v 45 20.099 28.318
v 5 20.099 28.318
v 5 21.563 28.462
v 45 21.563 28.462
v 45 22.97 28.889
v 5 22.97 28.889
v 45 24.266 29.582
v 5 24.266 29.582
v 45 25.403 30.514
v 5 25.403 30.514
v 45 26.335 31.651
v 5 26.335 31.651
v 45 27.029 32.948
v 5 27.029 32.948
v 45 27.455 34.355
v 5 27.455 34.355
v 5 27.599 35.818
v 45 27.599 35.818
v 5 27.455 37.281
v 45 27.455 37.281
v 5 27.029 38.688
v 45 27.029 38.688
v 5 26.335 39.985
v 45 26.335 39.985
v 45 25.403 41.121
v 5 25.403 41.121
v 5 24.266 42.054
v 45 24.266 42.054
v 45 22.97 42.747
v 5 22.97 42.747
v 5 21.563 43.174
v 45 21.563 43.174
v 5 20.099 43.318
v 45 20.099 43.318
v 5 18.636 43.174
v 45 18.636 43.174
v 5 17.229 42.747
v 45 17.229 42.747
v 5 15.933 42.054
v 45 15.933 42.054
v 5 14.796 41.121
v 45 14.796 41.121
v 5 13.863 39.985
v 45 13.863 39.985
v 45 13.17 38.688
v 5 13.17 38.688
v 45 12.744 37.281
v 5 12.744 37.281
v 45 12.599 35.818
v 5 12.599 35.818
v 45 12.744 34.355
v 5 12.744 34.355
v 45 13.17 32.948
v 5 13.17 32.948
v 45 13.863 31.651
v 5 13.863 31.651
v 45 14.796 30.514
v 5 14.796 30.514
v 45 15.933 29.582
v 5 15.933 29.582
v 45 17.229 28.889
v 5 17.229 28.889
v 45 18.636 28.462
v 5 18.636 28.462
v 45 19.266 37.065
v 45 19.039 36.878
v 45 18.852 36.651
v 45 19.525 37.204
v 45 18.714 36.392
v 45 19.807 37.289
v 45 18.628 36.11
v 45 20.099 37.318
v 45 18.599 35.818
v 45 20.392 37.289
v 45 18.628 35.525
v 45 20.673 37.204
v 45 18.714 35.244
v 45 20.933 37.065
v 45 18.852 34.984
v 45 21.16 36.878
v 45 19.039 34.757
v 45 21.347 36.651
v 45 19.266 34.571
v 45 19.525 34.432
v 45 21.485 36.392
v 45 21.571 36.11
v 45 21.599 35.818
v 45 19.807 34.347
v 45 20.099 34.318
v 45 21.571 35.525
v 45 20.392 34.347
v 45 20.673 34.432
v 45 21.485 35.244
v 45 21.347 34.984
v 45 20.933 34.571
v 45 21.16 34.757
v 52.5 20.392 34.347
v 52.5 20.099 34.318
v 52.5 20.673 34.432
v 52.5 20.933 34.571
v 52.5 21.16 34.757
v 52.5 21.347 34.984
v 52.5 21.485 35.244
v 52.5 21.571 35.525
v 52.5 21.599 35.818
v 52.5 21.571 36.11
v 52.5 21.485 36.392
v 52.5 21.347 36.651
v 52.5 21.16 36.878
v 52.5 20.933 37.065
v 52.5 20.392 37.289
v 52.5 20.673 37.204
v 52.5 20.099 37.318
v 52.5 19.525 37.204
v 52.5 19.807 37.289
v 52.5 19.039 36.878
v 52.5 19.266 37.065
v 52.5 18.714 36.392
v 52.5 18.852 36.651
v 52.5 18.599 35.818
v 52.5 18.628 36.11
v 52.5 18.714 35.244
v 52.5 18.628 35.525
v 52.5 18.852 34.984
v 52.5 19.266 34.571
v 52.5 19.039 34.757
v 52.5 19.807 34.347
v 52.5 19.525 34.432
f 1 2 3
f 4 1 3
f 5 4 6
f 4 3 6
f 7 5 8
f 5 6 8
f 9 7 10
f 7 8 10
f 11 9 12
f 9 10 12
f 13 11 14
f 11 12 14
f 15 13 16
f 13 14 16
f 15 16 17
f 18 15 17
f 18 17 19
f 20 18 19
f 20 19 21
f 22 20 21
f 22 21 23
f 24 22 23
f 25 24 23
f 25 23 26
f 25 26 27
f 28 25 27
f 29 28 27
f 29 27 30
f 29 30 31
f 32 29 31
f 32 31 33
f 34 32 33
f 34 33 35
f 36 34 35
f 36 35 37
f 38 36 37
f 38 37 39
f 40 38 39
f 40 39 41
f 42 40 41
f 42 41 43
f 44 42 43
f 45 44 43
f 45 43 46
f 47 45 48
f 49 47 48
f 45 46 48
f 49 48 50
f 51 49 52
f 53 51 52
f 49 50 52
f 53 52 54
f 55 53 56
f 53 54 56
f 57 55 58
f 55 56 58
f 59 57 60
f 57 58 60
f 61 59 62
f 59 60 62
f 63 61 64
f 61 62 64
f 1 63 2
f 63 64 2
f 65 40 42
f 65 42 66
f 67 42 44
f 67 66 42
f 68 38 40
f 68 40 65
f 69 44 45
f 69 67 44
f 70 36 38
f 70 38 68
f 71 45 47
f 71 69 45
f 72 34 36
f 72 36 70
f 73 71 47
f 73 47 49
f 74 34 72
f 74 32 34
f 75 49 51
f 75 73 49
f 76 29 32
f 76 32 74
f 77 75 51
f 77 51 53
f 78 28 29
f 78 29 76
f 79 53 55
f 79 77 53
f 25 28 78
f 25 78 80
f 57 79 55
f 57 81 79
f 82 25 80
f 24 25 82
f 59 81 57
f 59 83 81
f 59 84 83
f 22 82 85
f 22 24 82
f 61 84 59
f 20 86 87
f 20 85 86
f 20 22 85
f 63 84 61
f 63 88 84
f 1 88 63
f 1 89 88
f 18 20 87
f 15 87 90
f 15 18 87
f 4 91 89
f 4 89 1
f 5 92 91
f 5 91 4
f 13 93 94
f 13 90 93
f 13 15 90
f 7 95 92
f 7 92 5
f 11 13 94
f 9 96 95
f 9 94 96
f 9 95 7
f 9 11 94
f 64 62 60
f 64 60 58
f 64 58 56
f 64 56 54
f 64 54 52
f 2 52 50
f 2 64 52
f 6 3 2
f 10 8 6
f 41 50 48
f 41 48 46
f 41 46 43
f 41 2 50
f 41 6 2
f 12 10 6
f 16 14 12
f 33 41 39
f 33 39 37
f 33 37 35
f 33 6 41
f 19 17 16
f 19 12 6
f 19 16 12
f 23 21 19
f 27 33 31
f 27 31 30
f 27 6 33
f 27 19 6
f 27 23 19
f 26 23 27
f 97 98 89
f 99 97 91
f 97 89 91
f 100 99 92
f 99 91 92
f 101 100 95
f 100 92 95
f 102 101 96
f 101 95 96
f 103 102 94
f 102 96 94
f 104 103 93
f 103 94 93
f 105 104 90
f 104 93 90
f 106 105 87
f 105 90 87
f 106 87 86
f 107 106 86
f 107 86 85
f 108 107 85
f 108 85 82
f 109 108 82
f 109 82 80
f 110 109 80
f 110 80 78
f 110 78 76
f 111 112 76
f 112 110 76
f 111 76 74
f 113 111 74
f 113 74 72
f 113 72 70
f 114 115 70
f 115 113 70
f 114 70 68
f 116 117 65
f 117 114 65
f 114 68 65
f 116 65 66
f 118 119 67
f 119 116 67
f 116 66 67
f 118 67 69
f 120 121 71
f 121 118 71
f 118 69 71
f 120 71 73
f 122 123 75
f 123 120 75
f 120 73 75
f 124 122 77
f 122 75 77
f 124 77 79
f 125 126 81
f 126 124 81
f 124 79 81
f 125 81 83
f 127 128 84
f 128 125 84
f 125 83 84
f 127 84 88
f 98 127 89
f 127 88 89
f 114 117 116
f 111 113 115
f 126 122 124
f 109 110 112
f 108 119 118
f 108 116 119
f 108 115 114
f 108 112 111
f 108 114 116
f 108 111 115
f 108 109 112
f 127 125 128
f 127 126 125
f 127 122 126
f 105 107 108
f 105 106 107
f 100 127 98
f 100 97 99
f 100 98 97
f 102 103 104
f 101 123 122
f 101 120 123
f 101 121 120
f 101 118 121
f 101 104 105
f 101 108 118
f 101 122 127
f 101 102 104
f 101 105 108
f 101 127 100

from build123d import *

# Parameters (mm, degrees)
SKETCH1_R           = 7.5
BOSS_EXTRUDE1_DEPTH = 45
SKETCH2_R           = 1.5
BOSS_EXTRUDE2_DEPTH = 15
SKETCH3_R           = 3.389534101
CUT_EXTRUDE1_DEPTH  = 7.5
SKETCH4_R           = 13.089152616
CUT_EXTRUDE2_DEPTH  = 5


with BuildPart() as part:
    # Sketch1 → Boss-Extrude1 (new body)
    with BuildSketch(Plane(origin=(0, 0, 0), x_dir=(0, 0, -1), z_dir=(1, 0, 0))):
        with Locations((-35.817726835, 20.099436521)):
            Circle(SKETCH1_R)
    extrude(amount=BOSS_EXTRUDE1_DEPTH)

    # Sketch2 → Boss-Extrude2 (add)
    with BuildSketch(Plane(origin=(45, 0, 0), x_dir=(0, 0, -1), z_dir=(1, 0, 0))):
        with Locations((-35.817726835, 20.099436521)):
            Circle(SKETCH2_R)
    extrude(amount=BOSS_EXTRUDE2_DEPTH)

    # Sketch3 → Cut-Extrude1 (cut)
    with BuildSketch(Plane(origin=(60, 0, 0), x_dir=(0, 0, -1), z_dir=(1, 0, 0))):
        with Locations((-35.761209842, 20.149750274)):
            Circle(SKETCH3_R)
    extrude(amount=-CUT_EXTRUDE1_DEPTH, mode=Mode.SUBTRACT)

    # Sketch4 → Cut-Extrude2 (cut)
    with BuildSketch(Plane.ZY):
        with Locations((34.849696462, 19.463840008)):
            Circle(SKETCH4_R)
    extrude(amount=-CUT_EXTRUDE2_DEPTH, mode=Mode.SUBTRACT)


solid = part.part
